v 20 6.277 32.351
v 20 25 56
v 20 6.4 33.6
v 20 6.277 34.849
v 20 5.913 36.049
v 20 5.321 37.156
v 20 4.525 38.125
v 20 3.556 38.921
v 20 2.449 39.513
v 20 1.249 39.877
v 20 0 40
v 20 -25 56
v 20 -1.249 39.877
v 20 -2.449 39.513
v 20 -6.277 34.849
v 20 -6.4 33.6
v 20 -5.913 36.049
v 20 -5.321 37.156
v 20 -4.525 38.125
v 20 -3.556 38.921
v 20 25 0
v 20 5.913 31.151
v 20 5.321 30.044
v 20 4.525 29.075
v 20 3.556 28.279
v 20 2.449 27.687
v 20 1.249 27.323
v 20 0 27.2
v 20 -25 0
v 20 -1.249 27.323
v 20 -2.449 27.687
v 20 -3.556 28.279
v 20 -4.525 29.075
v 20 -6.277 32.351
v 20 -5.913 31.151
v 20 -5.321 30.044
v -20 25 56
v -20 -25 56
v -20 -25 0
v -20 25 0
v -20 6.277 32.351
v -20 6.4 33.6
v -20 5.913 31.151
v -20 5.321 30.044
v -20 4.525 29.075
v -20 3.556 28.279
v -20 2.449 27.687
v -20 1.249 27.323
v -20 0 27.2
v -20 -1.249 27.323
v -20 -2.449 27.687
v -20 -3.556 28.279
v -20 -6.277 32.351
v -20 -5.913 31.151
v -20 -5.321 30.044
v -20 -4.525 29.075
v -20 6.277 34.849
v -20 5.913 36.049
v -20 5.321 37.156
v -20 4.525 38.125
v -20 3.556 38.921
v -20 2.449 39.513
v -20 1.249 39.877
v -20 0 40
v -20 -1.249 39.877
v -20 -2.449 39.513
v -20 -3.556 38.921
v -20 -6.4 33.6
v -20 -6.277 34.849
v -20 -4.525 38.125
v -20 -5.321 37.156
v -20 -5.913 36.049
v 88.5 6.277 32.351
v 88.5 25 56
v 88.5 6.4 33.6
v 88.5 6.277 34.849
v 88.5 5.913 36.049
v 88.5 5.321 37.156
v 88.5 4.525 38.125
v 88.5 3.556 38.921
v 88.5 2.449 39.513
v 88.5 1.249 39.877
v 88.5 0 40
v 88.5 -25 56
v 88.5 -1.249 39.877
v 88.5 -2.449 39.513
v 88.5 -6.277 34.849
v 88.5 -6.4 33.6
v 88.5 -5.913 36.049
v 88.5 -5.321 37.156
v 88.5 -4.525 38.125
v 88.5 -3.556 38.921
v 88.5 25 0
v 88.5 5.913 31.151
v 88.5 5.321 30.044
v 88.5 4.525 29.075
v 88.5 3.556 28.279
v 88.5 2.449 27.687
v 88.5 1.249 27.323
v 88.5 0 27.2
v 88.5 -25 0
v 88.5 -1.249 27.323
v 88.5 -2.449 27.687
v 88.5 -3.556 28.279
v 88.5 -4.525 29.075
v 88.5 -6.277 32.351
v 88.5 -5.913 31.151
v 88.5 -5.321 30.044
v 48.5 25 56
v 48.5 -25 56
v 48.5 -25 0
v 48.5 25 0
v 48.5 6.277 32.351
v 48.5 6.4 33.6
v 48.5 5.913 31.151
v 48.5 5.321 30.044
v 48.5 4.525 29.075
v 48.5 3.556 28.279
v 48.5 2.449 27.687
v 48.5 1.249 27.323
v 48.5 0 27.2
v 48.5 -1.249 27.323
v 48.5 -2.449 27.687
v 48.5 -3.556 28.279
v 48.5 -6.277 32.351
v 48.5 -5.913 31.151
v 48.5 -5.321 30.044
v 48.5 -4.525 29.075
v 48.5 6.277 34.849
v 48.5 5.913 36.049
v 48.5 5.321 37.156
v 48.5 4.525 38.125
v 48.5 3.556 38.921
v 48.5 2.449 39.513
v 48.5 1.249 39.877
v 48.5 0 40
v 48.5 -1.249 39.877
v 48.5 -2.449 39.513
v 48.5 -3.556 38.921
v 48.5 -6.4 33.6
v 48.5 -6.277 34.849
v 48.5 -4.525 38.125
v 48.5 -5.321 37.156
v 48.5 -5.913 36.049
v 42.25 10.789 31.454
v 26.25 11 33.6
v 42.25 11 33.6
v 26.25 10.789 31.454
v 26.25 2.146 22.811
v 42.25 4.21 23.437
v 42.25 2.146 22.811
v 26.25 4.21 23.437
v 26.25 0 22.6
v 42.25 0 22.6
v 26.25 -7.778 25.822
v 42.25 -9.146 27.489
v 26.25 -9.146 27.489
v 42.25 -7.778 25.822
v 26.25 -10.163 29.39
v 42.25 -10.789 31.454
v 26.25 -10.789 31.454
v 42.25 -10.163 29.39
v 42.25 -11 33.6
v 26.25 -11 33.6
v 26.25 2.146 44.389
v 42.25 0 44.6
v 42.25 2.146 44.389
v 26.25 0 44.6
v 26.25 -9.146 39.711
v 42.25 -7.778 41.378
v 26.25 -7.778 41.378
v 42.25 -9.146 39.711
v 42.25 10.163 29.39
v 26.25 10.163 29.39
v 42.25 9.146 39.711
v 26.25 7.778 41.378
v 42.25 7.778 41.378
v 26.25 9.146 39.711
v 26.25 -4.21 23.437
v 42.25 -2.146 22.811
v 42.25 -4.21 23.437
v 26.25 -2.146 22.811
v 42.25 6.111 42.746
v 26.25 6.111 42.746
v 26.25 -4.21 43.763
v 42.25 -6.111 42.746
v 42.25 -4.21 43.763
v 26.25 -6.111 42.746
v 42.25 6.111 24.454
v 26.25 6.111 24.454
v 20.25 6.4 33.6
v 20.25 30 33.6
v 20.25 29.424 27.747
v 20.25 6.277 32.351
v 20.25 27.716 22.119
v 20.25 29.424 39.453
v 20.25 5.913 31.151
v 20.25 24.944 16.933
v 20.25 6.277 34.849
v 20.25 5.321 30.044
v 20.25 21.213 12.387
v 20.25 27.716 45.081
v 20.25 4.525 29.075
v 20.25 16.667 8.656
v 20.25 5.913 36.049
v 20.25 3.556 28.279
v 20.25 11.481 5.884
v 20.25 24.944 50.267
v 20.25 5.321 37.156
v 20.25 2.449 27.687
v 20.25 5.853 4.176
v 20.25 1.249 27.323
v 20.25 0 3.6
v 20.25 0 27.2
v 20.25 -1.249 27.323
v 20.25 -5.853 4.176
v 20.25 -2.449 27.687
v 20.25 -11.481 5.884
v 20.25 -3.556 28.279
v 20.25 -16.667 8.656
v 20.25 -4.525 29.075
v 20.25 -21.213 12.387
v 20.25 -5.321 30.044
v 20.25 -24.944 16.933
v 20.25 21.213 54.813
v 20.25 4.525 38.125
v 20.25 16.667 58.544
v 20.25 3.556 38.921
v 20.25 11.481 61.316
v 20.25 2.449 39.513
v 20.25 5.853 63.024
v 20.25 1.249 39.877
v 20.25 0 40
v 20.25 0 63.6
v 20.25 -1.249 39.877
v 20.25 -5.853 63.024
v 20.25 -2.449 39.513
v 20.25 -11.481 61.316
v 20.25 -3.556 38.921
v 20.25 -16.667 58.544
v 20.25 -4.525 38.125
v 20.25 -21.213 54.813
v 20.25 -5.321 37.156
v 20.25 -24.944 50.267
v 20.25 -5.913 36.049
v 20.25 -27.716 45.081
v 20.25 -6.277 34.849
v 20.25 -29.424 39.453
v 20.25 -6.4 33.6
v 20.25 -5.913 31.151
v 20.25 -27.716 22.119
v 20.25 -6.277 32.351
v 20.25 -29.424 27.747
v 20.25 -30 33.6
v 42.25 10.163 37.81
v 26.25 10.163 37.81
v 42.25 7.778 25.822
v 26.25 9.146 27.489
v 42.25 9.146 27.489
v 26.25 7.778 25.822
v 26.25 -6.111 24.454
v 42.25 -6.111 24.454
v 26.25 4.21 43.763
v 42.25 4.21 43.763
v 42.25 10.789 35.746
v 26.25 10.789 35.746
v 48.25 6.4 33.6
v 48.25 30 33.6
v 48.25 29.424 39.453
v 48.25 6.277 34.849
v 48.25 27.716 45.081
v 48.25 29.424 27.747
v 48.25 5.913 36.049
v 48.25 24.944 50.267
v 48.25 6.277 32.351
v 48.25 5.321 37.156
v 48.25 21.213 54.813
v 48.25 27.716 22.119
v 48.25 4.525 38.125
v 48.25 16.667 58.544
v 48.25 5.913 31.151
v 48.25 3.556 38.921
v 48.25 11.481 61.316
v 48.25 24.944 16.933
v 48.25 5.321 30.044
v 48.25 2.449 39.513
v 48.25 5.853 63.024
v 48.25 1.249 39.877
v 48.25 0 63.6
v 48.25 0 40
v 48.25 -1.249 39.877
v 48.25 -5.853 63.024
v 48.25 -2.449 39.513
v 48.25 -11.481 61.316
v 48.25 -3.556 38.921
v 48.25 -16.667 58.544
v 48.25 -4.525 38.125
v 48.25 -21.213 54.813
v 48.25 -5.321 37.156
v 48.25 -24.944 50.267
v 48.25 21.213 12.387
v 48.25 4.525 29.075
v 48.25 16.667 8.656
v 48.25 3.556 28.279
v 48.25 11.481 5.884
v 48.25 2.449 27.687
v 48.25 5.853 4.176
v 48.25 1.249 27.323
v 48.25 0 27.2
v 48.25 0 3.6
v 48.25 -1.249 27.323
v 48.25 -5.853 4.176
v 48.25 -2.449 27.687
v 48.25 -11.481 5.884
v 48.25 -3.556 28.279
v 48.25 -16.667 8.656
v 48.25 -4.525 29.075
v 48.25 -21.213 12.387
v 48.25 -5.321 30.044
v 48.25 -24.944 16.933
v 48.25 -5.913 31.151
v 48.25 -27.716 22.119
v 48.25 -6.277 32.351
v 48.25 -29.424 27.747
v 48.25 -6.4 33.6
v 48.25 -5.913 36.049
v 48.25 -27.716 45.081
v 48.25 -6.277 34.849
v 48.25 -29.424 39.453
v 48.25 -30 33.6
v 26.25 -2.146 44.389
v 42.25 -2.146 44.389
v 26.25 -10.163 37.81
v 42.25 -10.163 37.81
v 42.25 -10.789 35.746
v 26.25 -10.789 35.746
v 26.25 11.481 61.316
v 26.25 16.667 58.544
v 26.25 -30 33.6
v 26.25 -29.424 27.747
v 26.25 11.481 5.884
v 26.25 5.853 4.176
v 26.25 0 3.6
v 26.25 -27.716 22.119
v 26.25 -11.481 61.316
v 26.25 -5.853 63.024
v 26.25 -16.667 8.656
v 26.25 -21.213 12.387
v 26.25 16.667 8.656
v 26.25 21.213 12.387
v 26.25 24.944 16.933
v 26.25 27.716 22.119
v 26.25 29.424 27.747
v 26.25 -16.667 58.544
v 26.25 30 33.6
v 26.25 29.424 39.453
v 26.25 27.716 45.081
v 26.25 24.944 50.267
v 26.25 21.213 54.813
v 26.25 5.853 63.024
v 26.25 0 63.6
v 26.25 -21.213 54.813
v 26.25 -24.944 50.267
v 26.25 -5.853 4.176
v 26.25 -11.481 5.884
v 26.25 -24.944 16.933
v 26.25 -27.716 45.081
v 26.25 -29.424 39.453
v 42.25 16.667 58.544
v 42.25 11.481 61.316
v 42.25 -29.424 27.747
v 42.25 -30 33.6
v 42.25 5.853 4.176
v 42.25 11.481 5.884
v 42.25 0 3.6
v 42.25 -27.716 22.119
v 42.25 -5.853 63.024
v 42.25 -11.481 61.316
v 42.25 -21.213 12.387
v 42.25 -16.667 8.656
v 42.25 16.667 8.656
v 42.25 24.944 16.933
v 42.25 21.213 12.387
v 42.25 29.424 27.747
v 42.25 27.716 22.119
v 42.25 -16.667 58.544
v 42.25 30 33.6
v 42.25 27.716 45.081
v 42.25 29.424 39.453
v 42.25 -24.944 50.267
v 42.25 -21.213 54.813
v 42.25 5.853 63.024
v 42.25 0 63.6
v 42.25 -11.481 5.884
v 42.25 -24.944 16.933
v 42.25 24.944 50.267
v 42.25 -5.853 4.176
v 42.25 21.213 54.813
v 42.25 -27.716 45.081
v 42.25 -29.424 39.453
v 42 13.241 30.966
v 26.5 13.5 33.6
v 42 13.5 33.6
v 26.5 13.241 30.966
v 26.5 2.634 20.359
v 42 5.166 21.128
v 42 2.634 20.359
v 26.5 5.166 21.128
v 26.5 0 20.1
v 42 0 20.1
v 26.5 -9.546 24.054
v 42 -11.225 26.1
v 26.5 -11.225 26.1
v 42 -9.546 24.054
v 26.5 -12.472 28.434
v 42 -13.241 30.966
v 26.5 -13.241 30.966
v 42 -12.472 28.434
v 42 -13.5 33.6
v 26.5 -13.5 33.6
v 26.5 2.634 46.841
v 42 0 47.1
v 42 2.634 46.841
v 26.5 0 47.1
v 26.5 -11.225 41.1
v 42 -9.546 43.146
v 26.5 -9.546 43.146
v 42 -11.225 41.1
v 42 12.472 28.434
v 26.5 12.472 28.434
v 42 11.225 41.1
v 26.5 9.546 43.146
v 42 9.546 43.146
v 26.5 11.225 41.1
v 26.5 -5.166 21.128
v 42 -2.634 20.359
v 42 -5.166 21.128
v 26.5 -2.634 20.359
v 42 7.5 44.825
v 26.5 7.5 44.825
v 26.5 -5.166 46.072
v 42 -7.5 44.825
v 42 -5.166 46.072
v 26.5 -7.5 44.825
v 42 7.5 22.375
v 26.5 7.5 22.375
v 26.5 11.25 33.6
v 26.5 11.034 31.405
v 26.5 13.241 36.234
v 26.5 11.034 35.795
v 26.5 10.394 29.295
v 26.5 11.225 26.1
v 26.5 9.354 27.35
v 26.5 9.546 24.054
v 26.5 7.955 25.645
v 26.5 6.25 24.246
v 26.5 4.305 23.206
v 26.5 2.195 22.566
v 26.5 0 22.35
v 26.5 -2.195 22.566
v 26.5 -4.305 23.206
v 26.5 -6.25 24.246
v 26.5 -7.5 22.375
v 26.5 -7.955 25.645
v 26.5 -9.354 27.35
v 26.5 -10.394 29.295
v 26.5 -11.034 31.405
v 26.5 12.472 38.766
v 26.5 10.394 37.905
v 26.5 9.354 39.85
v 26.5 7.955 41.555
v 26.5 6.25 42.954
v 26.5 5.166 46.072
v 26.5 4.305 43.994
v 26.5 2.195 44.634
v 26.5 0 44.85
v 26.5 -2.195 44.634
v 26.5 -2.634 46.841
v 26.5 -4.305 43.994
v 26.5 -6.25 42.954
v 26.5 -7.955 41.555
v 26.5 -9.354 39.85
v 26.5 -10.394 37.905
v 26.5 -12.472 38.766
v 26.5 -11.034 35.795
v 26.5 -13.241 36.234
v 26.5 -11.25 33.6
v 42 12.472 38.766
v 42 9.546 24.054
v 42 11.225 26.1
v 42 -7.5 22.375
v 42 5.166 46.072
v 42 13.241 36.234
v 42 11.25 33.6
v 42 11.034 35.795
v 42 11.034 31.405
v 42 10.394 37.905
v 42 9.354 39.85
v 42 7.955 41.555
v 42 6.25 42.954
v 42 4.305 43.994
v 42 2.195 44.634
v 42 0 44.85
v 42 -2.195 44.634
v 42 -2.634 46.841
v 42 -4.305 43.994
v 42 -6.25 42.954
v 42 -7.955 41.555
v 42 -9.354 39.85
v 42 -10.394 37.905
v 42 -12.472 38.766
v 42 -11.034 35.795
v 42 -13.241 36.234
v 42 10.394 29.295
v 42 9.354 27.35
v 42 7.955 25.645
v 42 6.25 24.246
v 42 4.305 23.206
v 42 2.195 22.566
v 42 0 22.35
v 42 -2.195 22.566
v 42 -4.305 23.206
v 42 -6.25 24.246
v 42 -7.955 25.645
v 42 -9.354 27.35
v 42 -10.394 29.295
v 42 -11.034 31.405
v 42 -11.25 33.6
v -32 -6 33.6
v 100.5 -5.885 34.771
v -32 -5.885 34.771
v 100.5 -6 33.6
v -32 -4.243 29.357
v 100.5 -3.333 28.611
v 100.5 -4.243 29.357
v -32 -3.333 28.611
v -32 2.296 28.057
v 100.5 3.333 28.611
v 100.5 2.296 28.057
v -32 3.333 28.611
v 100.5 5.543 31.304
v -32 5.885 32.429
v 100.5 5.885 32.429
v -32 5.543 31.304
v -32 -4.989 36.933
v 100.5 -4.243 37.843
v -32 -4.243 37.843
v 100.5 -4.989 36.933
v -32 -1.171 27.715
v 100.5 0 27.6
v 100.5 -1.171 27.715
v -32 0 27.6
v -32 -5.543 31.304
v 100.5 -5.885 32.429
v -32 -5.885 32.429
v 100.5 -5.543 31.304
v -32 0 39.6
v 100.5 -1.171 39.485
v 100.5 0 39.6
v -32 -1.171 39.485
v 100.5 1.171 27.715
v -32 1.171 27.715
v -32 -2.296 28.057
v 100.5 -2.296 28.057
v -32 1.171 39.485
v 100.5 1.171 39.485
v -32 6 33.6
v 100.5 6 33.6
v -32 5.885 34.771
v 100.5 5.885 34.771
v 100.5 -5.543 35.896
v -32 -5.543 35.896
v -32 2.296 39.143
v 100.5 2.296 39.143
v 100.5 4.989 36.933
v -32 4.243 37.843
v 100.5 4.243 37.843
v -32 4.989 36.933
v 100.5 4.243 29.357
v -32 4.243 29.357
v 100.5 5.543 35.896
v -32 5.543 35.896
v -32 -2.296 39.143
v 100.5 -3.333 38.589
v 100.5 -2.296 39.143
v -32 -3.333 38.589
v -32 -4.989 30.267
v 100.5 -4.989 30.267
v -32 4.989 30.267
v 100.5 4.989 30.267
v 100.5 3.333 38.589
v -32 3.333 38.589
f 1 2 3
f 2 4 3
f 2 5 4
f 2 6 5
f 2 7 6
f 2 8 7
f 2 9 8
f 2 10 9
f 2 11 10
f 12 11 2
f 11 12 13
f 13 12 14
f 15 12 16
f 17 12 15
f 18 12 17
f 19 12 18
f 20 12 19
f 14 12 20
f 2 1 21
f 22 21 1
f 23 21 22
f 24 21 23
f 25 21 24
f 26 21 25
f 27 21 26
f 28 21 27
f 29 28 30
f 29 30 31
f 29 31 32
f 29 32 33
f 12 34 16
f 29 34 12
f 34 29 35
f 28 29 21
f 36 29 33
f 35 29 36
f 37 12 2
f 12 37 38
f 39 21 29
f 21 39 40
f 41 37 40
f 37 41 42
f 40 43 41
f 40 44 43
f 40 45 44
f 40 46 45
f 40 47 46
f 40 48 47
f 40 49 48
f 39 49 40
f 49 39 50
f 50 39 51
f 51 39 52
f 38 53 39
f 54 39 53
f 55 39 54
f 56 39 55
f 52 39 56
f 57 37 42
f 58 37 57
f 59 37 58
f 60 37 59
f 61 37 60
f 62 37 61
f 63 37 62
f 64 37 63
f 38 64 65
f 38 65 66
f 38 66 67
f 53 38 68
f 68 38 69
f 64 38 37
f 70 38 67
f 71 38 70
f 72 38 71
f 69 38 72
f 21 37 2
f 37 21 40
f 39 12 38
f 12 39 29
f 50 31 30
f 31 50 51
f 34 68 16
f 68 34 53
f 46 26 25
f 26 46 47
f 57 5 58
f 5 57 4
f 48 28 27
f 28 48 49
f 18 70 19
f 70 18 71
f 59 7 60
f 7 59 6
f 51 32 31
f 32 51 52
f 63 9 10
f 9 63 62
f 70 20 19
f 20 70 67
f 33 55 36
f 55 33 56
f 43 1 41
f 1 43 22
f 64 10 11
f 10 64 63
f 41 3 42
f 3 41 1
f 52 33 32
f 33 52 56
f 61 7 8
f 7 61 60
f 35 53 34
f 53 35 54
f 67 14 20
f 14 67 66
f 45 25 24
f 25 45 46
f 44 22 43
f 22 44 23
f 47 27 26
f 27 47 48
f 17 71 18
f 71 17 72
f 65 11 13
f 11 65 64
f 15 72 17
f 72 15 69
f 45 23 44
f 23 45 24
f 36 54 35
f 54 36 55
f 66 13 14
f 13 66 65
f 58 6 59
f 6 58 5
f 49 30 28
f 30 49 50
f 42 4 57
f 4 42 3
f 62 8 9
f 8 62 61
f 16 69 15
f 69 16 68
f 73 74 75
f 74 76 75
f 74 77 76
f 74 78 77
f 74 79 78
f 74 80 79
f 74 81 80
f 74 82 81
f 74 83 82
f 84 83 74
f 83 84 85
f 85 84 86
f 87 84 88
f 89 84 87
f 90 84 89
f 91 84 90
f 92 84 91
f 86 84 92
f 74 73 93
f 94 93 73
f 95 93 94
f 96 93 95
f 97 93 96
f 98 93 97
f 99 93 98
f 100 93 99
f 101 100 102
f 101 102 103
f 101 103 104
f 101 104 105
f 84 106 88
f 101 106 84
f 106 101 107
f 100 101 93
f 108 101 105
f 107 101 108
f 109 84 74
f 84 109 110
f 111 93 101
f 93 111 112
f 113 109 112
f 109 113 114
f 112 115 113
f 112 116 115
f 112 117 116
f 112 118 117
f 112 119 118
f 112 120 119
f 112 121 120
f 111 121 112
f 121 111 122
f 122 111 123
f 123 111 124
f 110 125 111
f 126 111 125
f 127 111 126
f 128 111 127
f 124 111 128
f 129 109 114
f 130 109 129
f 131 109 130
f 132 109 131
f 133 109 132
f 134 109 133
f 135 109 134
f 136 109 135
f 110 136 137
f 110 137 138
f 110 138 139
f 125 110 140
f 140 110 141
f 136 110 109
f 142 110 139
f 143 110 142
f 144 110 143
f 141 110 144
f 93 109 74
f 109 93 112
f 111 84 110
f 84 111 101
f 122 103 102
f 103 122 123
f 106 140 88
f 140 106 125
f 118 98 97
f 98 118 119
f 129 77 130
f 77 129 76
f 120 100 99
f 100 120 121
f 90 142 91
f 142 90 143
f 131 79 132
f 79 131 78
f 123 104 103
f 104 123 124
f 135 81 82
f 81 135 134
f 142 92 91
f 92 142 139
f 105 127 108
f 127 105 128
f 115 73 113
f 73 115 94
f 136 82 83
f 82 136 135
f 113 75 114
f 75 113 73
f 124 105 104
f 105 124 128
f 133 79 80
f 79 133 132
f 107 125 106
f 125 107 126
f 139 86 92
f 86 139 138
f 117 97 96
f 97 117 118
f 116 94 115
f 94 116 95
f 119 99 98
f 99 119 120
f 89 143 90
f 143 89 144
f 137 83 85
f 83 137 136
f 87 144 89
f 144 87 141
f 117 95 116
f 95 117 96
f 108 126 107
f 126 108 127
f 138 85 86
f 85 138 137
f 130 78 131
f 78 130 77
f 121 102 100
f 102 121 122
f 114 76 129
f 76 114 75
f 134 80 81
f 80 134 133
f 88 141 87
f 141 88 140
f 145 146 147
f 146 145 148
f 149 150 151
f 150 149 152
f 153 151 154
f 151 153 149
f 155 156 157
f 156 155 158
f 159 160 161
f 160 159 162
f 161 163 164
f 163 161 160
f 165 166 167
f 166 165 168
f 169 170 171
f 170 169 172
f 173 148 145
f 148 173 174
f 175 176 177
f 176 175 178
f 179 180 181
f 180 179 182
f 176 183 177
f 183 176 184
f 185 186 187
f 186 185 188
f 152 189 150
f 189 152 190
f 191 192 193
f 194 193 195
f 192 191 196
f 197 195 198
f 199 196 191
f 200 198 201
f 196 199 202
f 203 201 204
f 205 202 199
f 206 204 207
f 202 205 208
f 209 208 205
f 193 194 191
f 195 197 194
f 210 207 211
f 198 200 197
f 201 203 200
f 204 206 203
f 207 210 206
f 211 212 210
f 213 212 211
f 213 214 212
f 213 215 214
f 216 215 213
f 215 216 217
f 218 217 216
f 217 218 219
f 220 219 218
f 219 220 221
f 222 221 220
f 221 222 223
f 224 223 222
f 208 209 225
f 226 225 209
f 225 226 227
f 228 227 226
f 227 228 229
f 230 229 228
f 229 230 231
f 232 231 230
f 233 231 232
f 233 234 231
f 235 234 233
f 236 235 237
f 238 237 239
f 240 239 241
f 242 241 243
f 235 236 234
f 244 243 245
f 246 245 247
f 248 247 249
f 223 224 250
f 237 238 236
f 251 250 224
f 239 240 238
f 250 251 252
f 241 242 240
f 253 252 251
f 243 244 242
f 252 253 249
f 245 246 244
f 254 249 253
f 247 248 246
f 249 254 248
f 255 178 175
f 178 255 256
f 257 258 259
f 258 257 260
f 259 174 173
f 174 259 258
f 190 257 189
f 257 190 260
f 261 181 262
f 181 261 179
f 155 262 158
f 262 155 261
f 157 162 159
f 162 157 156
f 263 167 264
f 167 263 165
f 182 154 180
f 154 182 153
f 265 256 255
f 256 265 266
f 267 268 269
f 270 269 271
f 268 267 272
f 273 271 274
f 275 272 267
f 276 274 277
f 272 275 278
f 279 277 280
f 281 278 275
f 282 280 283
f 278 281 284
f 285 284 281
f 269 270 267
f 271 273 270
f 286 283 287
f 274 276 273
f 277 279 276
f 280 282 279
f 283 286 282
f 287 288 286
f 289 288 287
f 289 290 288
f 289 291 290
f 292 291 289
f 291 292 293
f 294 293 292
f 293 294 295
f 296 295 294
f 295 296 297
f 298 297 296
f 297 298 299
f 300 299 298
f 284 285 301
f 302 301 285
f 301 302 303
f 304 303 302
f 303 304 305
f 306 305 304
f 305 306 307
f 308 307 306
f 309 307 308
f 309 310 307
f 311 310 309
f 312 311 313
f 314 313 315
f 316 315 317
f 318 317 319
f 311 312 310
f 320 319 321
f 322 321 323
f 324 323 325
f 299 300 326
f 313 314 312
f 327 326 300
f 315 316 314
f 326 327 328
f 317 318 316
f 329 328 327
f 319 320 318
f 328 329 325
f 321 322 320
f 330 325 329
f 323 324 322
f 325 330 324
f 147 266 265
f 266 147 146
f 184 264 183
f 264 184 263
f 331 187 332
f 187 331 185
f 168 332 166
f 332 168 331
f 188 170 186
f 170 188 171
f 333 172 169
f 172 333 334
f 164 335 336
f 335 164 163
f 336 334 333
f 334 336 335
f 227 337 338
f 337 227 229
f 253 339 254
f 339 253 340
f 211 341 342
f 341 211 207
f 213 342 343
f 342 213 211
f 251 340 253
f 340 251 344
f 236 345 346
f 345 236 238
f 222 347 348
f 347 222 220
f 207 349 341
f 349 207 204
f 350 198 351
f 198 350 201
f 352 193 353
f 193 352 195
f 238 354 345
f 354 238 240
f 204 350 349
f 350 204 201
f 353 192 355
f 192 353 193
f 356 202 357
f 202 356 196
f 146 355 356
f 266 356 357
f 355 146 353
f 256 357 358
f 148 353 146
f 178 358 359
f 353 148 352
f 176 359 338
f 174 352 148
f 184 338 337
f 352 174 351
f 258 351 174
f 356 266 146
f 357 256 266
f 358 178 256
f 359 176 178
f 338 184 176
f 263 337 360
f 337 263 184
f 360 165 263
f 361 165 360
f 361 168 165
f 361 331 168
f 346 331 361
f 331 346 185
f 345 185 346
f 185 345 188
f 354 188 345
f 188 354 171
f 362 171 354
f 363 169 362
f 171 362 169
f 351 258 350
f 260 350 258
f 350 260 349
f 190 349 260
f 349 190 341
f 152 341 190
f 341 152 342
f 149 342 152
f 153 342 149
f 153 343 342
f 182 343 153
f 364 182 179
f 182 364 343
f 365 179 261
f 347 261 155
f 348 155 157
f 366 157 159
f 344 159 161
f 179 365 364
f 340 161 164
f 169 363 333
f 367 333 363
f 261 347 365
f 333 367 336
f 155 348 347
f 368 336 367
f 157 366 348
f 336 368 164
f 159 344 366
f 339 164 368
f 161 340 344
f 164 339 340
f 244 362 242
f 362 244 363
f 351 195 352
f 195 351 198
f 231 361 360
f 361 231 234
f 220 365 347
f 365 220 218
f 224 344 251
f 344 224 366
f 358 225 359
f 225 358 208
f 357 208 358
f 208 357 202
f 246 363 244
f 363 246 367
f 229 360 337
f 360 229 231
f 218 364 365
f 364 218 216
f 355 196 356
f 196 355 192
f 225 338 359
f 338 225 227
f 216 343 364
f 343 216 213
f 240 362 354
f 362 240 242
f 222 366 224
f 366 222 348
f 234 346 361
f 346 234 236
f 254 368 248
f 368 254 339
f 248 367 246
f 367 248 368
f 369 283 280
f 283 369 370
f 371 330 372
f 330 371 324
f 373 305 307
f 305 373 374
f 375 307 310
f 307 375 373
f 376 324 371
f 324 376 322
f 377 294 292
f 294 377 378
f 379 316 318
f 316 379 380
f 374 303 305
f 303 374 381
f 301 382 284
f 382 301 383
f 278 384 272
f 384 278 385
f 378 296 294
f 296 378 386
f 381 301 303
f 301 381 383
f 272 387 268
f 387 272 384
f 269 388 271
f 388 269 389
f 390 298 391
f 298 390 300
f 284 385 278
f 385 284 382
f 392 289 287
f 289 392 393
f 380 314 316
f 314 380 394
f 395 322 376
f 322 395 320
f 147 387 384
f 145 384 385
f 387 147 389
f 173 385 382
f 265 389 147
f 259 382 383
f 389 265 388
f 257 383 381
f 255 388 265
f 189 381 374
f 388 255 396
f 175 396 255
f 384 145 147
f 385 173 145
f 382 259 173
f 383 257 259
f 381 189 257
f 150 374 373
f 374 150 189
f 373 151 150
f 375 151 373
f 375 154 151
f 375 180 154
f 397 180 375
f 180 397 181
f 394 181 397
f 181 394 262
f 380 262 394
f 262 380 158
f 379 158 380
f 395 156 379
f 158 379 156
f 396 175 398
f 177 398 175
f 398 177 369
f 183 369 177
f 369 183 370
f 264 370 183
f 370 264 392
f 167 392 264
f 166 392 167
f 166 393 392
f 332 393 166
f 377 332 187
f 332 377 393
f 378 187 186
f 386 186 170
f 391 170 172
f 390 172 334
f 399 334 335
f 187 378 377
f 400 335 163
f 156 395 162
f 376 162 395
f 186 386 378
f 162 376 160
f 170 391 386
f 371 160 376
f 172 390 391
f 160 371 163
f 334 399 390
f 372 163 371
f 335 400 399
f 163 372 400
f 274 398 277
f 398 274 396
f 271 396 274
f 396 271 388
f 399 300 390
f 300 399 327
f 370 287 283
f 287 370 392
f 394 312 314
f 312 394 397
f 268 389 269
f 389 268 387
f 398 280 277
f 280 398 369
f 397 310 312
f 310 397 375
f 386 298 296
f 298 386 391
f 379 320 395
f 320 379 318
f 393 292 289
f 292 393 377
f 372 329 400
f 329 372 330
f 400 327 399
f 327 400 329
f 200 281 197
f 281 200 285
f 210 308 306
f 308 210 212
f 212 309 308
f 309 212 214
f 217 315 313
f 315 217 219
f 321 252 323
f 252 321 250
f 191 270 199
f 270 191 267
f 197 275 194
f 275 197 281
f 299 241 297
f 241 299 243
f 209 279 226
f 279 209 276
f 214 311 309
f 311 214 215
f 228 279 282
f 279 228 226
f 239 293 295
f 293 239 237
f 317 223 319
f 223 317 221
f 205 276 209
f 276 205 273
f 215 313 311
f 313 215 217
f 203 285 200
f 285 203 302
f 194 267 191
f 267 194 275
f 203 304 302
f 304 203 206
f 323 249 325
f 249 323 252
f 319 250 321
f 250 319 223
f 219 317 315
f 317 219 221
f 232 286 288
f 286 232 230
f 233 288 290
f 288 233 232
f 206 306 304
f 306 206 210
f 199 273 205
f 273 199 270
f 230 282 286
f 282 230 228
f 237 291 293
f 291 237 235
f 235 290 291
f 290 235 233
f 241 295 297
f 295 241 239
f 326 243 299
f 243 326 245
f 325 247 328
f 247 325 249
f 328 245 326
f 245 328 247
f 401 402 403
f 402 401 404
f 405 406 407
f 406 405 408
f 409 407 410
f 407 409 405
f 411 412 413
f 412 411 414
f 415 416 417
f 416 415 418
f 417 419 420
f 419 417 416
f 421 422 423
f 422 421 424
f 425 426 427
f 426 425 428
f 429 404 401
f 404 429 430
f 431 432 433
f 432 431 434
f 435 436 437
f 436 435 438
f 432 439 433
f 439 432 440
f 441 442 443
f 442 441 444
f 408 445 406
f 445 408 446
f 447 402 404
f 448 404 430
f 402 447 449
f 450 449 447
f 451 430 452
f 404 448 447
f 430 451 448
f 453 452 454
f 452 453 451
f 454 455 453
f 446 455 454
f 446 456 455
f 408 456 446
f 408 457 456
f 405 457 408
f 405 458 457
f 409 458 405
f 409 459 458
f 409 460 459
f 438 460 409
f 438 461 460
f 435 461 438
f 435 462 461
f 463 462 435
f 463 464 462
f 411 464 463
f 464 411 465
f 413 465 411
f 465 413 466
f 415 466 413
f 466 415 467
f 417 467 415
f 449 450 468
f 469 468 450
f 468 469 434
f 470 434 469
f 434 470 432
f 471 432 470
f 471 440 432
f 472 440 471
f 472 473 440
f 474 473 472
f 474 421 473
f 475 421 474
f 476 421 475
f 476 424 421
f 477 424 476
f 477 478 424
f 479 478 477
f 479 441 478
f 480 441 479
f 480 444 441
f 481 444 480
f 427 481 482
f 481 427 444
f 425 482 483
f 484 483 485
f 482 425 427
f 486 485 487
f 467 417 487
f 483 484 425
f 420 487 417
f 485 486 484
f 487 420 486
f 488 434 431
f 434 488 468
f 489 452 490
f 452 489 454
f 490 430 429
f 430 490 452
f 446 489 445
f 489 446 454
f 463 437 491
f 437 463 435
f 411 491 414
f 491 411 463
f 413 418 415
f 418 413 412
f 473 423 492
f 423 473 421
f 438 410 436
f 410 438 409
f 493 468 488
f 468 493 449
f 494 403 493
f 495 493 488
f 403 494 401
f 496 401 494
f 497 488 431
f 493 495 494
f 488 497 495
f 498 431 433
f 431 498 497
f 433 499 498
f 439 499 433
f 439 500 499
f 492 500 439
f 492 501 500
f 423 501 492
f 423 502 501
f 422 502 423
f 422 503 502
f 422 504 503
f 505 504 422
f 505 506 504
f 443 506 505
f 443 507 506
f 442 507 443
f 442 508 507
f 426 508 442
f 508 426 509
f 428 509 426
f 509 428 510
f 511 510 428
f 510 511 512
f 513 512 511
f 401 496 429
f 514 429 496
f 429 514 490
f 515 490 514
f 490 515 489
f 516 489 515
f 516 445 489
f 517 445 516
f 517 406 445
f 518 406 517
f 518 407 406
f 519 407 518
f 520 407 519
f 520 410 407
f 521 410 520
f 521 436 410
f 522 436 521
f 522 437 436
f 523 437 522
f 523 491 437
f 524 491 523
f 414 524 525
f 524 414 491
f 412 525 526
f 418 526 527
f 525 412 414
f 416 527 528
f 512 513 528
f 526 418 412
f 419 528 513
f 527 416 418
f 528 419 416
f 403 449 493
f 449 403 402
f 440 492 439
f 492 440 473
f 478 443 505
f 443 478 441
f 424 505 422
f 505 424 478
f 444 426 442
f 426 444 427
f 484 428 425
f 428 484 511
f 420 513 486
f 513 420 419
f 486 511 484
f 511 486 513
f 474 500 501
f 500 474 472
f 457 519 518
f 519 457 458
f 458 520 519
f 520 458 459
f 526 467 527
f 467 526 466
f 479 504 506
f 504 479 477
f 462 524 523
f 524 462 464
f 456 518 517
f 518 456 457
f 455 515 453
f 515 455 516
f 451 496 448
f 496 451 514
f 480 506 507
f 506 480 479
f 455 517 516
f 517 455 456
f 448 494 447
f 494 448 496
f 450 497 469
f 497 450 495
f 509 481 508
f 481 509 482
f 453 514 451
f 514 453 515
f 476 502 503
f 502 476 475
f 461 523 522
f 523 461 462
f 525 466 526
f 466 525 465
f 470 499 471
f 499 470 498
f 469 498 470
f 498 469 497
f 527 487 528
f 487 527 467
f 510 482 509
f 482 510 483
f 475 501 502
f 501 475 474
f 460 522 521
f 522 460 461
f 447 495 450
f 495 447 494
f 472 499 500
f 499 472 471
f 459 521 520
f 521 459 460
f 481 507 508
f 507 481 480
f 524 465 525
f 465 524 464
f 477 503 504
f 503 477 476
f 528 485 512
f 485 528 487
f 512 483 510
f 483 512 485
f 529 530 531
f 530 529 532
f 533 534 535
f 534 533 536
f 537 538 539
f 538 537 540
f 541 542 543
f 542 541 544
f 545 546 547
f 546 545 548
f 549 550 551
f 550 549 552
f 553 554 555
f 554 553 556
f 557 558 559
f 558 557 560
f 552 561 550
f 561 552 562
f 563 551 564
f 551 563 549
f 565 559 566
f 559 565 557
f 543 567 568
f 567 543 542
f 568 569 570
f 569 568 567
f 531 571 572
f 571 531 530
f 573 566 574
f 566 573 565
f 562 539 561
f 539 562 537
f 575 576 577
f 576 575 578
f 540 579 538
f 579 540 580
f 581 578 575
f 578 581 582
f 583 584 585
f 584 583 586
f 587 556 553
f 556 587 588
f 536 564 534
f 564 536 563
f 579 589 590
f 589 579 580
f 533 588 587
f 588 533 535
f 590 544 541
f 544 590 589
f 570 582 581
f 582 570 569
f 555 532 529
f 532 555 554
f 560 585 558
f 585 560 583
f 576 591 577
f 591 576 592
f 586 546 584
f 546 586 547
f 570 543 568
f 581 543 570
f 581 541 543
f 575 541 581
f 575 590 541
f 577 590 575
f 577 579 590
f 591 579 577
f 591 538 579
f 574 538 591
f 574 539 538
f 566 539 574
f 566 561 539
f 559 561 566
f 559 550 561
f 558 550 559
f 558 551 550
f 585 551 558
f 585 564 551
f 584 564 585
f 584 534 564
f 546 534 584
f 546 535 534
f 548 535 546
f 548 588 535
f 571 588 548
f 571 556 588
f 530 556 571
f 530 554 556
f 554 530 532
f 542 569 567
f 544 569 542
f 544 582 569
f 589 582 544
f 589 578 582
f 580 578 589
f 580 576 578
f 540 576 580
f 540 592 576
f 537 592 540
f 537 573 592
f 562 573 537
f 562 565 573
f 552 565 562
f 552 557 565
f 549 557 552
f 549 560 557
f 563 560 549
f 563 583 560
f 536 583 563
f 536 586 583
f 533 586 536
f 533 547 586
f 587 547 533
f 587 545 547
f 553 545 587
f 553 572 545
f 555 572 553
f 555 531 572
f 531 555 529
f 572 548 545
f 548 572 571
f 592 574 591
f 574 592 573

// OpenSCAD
$fn = 32;

// ------------------------------------------------------------------------
// Pulley assembly: d60 pulley with a belt, shaft d12
// Every part is its own module, assembly() places them once.
// ------------------------------------------------------------------------

// --- part 1 ---
module support1() {
  difference() {
    translate([-20, -25, 0]) cube([40, 50, 56]);
    translate([0, 0, 33.6]) rotate([0, 90, 0]) cylinder(h = 42, d = 12.8, center = true);
  }
}

// --- part 2 ---
module support2() {
  difference() {
    translate([-20, -25, 0]) cube([40, 50, 56]);
    translate([0, 0, 33.6]) rotate([0, 90, 0]) cylinder(h = 42, d = 12.8, center = true);
  }
}

// --- part 3 ---
module shaft() {
  translate([0, 0, -66.25]) cylinder(h = 132.5, d = 12);
}

// --- part 4 ---
module pulley() {
  difference() {
    union() {
      cylinder(h = 28, d = 22);
      cylinder(h = 6, d = 60);
      translate([0, 0, 22]) cylinder(h = 6, d = 60);
    }
    translate([0, 0, -1]) cylinder(h = 30, d = 12.8);
  }
}

// --- part 5 ---
module belt() {
  difference() {
      translate([0, 0, 0]) cylinder(h = 15.5, d = 27);
      translate([0, 0, -1]) cylinder(h = 17.5, d = 22.5);
    }
}

// --- assembly ---
module assembly() {
  translate([0, 0, 0]) rotate([0, 0, 0]) support1();
  translate([68.5, 0, 0]) rotate([0, 0, 0]) support2();
  translate([34.25, 0, 33.6]) rotate([0, 90, 0]) shaft();
  translate([20.25, 0, 33.6]) rotate([0, 90, 0]) pulley();
  translate([26.5, 0, 33.6]) rotate([0, 90, 0]) belt();
}

assembly();
